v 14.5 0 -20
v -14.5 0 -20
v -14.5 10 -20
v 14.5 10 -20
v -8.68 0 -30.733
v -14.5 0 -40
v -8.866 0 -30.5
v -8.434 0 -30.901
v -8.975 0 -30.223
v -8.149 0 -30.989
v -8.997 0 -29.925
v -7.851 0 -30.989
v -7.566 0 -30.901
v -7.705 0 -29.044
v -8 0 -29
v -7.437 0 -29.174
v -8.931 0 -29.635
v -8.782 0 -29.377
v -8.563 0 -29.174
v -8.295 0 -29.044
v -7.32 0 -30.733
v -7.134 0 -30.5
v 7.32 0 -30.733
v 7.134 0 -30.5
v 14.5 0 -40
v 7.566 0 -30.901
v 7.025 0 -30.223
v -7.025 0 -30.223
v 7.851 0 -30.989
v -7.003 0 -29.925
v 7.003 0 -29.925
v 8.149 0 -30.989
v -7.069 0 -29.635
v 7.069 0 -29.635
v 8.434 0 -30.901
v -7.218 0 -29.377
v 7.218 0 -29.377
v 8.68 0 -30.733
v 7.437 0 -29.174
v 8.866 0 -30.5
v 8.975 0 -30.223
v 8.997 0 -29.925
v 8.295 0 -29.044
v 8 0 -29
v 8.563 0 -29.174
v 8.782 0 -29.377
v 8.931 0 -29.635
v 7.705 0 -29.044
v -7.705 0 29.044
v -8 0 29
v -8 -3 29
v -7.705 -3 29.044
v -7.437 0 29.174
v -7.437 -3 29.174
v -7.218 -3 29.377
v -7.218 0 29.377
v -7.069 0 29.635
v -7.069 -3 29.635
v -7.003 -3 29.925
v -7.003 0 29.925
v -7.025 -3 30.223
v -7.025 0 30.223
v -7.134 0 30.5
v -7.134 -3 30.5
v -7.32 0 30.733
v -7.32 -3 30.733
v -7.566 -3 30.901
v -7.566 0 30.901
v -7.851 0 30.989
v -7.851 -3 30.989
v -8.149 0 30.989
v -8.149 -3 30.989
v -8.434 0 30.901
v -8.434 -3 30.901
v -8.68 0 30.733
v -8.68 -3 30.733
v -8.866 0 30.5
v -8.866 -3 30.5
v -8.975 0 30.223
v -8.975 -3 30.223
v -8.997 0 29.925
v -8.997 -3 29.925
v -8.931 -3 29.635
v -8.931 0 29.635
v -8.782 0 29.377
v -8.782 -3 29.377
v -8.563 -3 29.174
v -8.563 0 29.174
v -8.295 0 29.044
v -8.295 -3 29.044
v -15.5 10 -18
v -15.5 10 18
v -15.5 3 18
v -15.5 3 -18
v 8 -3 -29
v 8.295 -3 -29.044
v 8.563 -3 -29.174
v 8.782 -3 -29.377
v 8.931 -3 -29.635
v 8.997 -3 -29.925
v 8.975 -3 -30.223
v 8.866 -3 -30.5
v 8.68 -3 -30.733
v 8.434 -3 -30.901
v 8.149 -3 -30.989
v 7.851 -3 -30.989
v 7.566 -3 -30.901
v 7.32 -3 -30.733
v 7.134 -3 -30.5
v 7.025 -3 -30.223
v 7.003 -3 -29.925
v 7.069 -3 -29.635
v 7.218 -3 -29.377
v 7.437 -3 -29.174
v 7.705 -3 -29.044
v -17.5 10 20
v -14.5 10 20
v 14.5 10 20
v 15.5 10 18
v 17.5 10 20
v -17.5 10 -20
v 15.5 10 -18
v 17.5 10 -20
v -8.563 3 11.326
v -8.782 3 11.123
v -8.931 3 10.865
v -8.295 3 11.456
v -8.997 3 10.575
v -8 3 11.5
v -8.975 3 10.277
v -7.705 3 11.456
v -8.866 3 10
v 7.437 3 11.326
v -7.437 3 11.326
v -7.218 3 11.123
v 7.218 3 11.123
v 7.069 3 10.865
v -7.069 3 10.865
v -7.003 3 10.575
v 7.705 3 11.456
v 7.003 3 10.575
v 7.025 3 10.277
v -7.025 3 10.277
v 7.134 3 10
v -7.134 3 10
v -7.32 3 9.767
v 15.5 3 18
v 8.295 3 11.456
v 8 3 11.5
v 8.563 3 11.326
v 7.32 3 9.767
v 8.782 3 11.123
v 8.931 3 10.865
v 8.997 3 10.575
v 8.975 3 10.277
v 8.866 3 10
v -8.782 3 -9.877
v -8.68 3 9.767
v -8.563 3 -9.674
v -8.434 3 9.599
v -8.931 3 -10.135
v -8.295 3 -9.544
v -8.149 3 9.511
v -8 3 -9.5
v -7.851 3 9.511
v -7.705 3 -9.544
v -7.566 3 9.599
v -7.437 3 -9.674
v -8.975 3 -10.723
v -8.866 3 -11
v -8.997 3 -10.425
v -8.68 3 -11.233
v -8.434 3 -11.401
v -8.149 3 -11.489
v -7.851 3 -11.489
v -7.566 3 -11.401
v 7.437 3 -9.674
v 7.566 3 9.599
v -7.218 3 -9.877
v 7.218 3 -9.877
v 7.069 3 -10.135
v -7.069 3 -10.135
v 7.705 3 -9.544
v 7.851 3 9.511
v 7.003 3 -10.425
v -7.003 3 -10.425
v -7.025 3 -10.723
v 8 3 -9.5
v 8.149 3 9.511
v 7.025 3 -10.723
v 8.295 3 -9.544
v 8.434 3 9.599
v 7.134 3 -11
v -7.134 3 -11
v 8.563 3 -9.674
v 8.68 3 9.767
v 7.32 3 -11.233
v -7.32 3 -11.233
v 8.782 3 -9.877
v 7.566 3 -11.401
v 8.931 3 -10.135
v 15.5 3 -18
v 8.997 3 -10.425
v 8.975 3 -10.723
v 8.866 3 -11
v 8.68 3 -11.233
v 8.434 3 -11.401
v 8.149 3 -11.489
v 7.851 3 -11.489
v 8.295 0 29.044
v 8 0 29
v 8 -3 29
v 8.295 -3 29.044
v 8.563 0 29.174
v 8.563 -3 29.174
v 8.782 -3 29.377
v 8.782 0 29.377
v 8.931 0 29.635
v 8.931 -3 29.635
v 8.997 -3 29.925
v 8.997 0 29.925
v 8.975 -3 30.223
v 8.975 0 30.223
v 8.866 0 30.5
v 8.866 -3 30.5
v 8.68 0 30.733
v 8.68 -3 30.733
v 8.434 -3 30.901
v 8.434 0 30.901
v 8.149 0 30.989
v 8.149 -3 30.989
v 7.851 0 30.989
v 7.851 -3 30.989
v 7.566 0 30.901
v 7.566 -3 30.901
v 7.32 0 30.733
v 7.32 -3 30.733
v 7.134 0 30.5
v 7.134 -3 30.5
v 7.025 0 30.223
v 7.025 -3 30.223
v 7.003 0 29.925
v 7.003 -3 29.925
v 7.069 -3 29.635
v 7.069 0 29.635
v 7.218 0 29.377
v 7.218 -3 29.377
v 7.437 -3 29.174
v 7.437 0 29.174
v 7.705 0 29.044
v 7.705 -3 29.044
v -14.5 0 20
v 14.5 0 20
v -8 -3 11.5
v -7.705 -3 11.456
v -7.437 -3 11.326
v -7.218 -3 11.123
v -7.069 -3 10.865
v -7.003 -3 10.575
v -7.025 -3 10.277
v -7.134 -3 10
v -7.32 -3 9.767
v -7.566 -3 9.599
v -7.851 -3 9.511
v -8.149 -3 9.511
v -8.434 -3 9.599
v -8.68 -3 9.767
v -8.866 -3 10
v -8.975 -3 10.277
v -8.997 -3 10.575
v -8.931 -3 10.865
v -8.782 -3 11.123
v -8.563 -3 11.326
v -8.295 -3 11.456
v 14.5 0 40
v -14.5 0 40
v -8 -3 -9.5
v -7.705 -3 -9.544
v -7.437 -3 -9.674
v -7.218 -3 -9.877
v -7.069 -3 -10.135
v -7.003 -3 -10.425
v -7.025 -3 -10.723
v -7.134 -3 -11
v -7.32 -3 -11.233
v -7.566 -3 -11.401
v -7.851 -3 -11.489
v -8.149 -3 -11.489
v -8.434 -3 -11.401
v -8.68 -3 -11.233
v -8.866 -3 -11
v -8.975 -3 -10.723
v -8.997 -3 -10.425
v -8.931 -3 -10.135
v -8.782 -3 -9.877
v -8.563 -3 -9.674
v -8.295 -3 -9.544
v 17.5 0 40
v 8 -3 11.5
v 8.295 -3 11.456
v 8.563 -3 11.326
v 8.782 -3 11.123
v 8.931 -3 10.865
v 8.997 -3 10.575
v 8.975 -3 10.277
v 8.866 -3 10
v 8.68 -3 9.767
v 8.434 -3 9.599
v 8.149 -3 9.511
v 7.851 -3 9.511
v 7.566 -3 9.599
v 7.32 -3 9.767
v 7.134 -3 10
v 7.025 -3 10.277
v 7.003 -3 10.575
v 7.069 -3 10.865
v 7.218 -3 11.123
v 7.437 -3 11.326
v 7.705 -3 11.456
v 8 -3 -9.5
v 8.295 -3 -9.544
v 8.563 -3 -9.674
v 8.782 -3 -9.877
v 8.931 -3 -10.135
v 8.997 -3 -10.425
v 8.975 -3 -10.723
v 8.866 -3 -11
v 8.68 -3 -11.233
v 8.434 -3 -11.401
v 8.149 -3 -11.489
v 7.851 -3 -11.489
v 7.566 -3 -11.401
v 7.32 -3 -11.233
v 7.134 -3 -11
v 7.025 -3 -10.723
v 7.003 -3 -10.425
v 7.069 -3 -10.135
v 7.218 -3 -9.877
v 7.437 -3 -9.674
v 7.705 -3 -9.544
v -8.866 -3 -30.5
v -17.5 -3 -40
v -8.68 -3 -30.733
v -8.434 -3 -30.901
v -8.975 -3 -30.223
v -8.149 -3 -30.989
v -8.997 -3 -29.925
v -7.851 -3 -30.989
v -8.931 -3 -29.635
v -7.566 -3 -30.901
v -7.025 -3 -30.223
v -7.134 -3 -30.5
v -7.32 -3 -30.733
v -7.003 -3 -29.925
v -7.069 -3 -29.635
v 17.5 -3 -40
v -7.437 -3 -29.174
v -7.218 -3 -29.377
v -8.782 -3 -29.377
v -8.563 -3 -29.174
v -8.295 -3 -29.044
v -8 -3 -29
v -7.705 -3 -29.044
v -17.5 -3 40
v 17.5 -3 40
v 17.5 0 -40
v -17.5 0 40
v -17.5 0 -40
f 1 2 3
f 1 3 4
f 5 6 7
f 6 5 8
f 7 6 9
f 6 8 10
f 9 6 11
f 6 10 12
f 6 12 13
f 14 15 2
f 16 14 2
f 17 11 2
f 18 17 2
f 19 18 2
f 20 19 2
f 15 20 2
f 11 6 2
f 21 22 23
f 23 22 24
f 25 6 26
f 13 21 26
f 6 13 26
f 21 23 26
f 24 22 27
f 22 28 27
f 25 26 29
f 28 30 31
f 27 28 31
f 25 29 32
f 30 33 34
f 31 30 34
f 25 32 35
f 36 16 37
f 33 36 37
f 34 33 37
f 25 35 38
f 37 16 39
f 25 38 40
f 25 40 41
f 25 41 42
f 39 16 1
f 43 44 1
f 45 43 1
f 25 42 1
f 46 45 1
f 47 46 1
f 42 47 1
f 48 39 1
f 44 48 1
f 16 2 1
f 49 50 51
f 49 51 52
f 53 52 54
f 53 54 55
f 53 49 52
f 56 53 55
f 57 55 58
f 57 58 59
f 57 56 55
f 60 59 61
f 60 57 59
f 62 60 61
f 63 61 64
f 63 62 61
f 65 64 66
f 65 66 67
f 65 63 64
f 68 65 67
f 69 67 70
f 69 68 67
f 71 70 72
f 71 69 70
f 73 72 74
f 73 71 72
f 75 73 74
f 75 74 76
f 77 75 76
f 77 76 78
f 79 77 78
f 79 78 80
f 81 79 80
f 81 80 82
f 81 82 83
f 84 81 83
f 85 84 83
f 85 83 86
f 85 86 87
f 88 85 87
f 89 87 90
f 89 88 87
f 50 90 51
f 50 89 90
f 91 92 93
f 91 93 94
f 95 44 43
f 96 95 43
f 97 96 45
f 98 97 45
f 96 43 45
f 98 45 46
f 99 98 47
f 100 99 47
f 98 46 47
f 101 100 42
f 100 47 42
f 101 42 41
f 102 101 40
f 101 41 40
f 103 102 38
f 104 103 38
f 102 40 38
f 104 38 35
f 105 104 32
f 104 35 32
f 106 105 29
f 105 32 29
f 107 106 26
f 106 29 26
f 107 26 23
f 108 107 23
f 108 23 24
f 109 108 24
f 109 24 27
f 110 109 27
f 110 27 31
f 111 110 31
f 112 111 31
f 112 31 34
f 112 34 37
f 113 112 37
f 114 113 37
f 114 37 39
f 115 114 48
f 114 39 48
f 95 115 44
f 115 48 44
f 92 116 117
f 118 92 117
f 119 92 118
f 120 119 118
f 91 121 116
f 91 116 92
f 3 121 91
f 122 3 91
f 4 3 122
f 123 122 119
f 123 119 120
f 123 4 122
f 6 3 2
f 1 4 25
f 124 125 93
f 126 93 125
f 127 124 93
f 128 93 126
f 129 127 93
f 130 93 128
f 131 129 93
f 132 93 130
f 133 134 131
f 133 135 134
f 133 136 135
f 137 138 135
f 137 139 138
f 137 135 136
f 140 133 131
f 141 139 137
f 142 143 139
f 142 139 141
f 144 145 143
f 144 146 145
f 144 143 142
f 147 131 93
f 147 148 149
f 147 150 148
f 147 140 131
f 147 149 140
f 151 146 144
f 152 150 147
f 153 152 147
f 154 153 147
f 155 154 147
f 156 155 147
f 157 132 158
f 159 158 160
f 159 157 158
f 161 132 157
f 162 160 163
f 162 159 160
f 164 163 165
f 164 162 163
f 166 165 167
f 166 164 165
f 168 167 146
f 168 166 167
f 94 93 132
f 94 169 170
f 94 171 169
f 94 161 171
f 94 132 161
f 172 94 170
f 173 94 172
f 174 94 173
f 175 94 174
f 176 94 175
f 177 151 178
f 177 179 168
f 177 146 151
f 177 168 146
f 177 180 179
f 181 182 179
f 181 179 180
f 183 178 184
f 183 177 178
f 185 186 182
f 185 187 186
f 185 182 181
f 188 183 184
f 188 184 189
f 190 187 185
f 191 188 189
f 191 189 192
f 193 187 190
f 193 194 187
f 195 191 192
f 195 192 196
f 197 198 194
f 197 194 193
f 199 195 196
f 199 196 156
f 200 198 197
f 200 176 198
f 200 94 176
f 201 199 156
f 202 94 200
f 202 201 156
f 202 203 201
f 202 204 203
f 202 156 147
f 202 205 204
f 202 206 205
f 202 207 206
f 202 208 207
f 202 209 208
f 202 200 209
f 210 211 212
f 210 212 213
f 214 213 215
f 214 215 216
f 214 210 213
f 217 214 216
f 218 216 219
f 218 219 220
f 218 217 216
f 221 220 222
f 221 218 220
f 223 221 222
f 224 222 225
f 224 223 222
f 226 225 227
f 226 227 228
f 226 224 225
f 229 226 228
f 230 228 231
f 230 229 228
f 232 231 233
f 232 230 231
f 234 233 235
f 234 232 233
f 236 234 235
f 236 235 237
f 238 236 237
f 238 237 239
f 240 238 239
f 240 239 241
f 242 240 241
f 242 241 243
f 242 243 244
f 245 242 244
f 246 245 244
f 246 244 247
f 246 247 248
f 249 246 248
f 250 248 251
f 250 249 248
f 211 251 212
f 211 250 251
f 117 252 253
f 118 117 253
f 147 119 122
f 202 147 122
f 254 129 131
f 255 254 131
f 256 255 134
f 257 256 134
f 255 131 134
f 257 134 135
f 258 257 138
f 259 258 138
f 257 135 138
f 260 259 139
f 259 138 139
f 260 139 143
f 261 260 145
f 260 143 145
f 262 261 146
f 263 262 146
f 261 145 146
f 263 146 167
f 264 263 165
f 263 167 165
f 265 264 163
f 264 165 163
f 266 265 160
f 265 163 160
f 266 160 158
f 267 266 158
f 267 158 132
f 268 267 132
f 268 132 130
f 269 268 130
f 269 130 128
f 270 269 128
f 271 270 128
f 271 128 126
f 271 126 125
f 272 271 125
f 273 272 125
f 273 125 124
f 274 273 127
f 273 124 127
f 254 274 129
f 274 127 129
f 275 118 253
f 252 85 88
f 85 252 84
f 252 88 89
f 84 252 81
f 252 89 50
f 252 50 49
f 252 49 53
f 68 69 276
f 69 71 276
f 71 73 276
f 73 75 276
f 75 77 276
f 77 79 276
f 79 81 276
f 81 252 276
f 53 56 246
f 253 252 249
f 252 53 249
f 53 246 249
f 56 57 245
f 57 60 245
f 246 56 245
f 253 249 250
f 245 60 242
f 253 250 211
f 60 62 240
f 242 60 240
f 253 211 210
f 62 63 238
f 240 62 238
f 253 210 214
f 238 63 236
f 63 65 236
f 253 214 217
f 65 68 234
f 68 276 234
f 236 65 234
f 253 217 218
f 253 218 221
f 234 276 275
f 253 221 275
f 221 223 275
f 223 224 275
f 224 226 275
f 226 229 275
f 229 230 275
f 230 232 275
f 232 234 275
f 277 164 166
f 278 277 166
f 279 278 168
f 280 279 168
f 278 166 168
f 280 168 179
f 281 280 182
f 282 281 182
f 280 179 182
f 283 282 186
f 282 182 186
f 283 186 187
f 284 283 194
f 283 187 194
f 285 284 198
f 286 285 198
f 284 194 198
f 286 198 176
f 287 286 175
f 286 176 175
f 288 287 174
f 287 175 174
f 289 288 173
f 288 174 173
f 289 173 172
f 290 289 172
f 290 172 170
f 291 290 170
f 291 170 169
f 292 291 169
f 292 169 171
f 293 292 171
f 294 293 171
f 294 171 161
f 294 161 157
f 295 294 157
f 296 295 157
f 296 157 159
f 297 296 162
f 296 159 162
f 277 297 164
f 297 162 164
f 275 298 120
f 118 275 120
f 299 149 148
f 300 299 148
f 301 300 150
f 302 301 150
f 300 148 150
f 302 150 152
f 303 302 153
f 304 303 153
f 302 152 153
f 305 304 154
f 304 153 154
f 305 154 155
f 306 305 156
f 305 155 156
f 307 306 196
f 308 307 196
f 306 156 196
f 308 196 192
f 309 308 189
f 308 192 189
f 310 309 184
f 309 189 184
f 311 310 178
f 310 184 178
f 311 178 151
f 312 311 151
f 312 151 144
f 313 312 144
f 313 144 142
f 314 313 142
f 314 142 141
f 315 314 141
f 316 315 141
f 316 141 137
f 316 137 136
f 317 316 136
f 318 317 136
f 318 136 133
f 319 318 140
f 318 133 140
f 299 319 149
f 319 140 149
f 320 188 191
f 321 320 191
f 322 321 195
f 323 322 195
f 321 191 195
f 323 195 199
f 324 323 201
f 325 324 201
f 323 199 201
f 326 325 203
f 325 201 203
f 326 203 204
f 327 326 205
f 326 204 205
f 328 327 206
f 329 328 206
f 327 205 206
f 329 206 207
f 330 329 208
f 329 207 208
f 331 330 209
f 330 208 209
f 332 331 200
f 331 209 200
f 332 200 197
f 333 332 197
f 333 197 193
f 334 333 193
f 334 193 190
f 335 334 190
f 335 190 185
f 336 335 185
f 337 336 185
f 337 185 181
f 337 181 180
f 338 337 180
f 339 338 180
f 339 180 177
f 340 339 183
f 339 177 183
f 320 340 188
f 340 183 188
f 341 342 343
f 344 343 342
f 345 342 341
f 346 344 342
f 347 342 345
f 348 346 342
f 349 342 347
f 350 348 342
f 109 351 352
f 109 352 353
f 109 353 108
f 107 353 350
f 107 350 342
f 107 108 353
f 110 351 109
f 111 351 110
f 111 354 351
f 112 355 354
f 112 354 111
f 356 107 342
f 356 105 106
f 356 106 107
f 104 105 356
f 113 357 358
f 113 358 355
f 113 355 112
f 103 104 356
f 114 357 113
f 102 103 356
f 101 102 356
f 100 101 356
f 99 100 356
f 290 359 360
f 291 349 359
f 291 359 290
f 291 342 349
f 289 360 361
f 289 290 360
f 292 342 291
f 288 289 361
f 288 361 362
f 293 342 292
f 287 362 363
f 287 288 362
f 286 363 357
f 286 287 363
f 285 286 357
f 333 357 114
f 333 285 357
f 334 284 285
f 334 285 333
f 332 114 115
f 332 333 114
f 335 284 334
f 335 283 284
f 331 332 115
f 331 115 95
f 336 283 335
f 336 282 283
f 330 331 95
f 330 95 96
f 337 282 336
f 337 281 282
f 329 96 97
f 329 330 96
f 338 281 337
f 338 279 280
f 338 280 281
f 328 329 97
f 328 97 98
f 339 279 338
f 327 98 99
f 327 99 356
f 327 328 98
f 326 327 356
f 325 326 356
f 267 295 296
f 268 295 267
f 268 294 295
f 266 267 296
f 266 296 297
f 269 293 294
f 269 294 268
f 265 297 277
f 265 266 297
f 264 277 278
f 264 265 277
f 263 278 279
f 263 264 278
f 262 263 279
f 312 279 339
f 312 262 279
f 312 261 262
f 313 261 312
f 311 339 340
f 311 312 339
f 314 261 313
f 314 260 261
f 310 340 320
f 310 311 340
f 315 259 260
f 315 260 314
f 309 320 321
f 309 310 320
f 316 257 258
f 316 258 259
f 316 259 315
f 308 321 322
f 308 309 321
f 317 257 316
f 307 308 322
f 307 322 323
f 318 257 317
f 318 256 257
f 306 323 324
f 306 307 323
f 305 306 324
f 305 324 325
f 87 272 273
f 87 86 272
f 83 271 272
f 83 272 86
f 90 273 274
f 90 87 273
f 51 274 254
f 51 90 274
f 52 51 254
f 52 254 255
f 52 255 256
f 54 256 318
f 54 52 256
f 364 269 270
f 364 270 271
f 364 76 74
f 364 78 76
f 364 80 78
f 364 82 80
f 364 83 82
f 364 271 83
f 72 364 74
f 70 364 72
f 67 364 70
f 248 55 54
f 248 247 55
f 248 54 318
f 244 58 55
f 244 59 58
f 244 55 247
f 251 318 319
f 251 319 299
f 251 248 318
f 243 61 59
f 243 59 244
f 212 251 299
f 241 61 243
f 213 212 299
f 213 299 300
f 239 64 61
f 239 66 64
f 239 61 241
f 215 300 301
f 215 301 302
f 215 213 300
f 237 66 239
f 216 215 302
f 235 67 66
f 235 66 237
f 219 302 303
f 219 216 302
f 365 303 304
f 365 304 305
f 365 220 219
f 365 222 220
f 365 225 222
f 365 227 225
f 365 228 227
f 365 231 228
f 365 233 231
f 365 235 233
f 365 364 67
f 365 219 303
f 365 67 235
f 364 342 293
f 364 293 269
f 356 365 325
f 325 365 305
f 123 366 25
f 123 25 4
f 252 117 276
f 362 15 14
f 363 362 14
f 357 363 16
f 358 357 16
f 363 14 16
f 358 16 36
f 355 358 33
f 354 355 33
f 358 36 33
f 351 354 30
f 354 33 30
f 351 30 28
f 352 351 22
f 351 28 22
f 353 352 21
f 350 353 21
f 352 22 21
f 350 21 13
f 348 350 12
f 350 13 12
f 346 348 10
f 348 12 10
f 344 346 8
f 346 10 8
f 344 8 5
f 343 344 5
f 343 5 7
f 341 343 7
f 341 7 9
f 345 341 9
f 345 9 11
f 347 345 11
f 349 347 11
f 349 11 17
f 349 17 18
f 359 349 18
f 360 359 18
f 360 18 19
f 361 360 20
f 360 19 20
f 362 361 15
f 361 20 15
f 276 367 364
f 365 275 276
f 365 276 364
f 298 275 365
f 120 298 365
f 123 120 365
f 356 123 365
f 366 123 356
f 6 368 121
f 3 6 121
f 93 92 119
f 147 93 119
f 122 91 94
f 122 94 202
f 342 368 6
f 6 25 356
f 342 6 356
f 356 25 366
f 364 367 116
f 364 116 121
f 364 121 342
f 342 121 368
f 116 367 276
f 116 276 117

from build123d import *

# Parameters (mm, degrees)
SKETCH1_W           = 35
SKETCH1_H           = 40
BOSS_EXTRUDE1_DEPTH = 10
SKETCH2_W           = 31
SKETCH2_H           = 36
CUT_EXTRUDE1_DEPTH  = 7
SKETCH3_W           = 35
SKETCH3_H           = 80
BOSS_EXTRUDE2_DEPTH = 3
BOSS_EXTRUDE3_DEPTH = 3
SKETCH6_R           = 1
CUT_EXTRUDE2_DEPTH  = 6
SKETCH7_R           = 1
CUT_EXTRUDE3_DEPTH  = 3


with BuildPart() as part:
    # Sketch1 → Boss-Extrude1 (new body)
    with BuildSketch(Plane(origin=(0, 0, 0), x_dir=(1, 0, 0), z_dir=(0, 1, 0))):
        Rectangle(SKETCH1_W, SKETCH1_H)
    extrude(amount=BOSS_EXTRUDE1_DEPTH)

    # Sketch2 → Cut-Extrude1 (cut)
    with BuildSketch(Plane(origin=(0, 10, 0), x_dir=(1, 0, 0), z_dir=(0, 1, 0))):
        Rectangle(SKETCH2_W, SKETCH2_H)
    extrude(amount=-CUT_EXTRUDE1_DEPTH, mode=Mode.SUBTRACT)

    # Sketch3 → Boss-Extrude2 (add)
    with BuildSketch(Plane.XZ):
        Rectangle(SKETCH3_W, SKETCH3_H)
    extrude(amount=BOSS_EXTRUDE2_DEPTH)

    # Sketch5 → Boss-Extrude3 (add)
    with BuildSketch(Plane.ZY.offset(17.5)):
        Polygon((-20, 10), (-20, 0), (-40, 0), align=None)
        Polygon((20, 10), (20, 0), (40, 0), align=None)
    boss_extrude3 = extrude(amount=-BOSS_EXTRUDE3_DEPTH)

    # Mirror1: Boss-Extrude3 across plane
    add(boss_extrude3.mirror(Plane(origin=(0, 0, 0), x_dir=(0, 0, 1), z_dir=(1, 0, 0))))

    # Sketch6 → Cut-Extrude2 (cut)
    with BuildSketch(Plane(origin=(0, 3, 0), x_dir=(1, 0, 0), z_dir=(0, 1, 0))):
        with Locations(Location((-8, 10.5, 0), (0, 0, 270))):
            Circle(SKETCH6_R)
        with Locations(Location((8, 10.5, 0), (0, 0, 270))):
            Circle(SKETCH6_R)
        with Locations(Location((-8, -10.5, 0), (0, 0, 270))):
            Circle(SKETCH6_R)
        with Locations(Location((8, -10.5, 0), (0, 0, 270))):
            Circle(SKETCH6_R)
    extrude(amount=-CUT_EXTRUDE2_DEPTH, mode=Mode.SUBTRACT)

    # Sketch7 → Cut-Extrude3 (cut)
    with BuildSketch(Plane(origin=(0, 0, 0), x_dir=(1, 0, 0), z_dir=(0, 1, 0))):
        with Locations(Location((-8, 30, 0), (0, 0, 270))):
            Circle(SKETCH7_R)
        with Locations(Location((8, 30, 0), (0, 0, 270))):
            Circle(SKETCH7_R)
    cut_extrude3 = extrude(amount=-CUT_EXTRUDE3_DEPTH, mode=Mode.SUBTRACT)

    # Mirror2: Cut-Extrude3 across plane
    add(cut_extrude3.mirror(Plane.XY), mode=Mode.SUBTRACT)


solid = part.part
